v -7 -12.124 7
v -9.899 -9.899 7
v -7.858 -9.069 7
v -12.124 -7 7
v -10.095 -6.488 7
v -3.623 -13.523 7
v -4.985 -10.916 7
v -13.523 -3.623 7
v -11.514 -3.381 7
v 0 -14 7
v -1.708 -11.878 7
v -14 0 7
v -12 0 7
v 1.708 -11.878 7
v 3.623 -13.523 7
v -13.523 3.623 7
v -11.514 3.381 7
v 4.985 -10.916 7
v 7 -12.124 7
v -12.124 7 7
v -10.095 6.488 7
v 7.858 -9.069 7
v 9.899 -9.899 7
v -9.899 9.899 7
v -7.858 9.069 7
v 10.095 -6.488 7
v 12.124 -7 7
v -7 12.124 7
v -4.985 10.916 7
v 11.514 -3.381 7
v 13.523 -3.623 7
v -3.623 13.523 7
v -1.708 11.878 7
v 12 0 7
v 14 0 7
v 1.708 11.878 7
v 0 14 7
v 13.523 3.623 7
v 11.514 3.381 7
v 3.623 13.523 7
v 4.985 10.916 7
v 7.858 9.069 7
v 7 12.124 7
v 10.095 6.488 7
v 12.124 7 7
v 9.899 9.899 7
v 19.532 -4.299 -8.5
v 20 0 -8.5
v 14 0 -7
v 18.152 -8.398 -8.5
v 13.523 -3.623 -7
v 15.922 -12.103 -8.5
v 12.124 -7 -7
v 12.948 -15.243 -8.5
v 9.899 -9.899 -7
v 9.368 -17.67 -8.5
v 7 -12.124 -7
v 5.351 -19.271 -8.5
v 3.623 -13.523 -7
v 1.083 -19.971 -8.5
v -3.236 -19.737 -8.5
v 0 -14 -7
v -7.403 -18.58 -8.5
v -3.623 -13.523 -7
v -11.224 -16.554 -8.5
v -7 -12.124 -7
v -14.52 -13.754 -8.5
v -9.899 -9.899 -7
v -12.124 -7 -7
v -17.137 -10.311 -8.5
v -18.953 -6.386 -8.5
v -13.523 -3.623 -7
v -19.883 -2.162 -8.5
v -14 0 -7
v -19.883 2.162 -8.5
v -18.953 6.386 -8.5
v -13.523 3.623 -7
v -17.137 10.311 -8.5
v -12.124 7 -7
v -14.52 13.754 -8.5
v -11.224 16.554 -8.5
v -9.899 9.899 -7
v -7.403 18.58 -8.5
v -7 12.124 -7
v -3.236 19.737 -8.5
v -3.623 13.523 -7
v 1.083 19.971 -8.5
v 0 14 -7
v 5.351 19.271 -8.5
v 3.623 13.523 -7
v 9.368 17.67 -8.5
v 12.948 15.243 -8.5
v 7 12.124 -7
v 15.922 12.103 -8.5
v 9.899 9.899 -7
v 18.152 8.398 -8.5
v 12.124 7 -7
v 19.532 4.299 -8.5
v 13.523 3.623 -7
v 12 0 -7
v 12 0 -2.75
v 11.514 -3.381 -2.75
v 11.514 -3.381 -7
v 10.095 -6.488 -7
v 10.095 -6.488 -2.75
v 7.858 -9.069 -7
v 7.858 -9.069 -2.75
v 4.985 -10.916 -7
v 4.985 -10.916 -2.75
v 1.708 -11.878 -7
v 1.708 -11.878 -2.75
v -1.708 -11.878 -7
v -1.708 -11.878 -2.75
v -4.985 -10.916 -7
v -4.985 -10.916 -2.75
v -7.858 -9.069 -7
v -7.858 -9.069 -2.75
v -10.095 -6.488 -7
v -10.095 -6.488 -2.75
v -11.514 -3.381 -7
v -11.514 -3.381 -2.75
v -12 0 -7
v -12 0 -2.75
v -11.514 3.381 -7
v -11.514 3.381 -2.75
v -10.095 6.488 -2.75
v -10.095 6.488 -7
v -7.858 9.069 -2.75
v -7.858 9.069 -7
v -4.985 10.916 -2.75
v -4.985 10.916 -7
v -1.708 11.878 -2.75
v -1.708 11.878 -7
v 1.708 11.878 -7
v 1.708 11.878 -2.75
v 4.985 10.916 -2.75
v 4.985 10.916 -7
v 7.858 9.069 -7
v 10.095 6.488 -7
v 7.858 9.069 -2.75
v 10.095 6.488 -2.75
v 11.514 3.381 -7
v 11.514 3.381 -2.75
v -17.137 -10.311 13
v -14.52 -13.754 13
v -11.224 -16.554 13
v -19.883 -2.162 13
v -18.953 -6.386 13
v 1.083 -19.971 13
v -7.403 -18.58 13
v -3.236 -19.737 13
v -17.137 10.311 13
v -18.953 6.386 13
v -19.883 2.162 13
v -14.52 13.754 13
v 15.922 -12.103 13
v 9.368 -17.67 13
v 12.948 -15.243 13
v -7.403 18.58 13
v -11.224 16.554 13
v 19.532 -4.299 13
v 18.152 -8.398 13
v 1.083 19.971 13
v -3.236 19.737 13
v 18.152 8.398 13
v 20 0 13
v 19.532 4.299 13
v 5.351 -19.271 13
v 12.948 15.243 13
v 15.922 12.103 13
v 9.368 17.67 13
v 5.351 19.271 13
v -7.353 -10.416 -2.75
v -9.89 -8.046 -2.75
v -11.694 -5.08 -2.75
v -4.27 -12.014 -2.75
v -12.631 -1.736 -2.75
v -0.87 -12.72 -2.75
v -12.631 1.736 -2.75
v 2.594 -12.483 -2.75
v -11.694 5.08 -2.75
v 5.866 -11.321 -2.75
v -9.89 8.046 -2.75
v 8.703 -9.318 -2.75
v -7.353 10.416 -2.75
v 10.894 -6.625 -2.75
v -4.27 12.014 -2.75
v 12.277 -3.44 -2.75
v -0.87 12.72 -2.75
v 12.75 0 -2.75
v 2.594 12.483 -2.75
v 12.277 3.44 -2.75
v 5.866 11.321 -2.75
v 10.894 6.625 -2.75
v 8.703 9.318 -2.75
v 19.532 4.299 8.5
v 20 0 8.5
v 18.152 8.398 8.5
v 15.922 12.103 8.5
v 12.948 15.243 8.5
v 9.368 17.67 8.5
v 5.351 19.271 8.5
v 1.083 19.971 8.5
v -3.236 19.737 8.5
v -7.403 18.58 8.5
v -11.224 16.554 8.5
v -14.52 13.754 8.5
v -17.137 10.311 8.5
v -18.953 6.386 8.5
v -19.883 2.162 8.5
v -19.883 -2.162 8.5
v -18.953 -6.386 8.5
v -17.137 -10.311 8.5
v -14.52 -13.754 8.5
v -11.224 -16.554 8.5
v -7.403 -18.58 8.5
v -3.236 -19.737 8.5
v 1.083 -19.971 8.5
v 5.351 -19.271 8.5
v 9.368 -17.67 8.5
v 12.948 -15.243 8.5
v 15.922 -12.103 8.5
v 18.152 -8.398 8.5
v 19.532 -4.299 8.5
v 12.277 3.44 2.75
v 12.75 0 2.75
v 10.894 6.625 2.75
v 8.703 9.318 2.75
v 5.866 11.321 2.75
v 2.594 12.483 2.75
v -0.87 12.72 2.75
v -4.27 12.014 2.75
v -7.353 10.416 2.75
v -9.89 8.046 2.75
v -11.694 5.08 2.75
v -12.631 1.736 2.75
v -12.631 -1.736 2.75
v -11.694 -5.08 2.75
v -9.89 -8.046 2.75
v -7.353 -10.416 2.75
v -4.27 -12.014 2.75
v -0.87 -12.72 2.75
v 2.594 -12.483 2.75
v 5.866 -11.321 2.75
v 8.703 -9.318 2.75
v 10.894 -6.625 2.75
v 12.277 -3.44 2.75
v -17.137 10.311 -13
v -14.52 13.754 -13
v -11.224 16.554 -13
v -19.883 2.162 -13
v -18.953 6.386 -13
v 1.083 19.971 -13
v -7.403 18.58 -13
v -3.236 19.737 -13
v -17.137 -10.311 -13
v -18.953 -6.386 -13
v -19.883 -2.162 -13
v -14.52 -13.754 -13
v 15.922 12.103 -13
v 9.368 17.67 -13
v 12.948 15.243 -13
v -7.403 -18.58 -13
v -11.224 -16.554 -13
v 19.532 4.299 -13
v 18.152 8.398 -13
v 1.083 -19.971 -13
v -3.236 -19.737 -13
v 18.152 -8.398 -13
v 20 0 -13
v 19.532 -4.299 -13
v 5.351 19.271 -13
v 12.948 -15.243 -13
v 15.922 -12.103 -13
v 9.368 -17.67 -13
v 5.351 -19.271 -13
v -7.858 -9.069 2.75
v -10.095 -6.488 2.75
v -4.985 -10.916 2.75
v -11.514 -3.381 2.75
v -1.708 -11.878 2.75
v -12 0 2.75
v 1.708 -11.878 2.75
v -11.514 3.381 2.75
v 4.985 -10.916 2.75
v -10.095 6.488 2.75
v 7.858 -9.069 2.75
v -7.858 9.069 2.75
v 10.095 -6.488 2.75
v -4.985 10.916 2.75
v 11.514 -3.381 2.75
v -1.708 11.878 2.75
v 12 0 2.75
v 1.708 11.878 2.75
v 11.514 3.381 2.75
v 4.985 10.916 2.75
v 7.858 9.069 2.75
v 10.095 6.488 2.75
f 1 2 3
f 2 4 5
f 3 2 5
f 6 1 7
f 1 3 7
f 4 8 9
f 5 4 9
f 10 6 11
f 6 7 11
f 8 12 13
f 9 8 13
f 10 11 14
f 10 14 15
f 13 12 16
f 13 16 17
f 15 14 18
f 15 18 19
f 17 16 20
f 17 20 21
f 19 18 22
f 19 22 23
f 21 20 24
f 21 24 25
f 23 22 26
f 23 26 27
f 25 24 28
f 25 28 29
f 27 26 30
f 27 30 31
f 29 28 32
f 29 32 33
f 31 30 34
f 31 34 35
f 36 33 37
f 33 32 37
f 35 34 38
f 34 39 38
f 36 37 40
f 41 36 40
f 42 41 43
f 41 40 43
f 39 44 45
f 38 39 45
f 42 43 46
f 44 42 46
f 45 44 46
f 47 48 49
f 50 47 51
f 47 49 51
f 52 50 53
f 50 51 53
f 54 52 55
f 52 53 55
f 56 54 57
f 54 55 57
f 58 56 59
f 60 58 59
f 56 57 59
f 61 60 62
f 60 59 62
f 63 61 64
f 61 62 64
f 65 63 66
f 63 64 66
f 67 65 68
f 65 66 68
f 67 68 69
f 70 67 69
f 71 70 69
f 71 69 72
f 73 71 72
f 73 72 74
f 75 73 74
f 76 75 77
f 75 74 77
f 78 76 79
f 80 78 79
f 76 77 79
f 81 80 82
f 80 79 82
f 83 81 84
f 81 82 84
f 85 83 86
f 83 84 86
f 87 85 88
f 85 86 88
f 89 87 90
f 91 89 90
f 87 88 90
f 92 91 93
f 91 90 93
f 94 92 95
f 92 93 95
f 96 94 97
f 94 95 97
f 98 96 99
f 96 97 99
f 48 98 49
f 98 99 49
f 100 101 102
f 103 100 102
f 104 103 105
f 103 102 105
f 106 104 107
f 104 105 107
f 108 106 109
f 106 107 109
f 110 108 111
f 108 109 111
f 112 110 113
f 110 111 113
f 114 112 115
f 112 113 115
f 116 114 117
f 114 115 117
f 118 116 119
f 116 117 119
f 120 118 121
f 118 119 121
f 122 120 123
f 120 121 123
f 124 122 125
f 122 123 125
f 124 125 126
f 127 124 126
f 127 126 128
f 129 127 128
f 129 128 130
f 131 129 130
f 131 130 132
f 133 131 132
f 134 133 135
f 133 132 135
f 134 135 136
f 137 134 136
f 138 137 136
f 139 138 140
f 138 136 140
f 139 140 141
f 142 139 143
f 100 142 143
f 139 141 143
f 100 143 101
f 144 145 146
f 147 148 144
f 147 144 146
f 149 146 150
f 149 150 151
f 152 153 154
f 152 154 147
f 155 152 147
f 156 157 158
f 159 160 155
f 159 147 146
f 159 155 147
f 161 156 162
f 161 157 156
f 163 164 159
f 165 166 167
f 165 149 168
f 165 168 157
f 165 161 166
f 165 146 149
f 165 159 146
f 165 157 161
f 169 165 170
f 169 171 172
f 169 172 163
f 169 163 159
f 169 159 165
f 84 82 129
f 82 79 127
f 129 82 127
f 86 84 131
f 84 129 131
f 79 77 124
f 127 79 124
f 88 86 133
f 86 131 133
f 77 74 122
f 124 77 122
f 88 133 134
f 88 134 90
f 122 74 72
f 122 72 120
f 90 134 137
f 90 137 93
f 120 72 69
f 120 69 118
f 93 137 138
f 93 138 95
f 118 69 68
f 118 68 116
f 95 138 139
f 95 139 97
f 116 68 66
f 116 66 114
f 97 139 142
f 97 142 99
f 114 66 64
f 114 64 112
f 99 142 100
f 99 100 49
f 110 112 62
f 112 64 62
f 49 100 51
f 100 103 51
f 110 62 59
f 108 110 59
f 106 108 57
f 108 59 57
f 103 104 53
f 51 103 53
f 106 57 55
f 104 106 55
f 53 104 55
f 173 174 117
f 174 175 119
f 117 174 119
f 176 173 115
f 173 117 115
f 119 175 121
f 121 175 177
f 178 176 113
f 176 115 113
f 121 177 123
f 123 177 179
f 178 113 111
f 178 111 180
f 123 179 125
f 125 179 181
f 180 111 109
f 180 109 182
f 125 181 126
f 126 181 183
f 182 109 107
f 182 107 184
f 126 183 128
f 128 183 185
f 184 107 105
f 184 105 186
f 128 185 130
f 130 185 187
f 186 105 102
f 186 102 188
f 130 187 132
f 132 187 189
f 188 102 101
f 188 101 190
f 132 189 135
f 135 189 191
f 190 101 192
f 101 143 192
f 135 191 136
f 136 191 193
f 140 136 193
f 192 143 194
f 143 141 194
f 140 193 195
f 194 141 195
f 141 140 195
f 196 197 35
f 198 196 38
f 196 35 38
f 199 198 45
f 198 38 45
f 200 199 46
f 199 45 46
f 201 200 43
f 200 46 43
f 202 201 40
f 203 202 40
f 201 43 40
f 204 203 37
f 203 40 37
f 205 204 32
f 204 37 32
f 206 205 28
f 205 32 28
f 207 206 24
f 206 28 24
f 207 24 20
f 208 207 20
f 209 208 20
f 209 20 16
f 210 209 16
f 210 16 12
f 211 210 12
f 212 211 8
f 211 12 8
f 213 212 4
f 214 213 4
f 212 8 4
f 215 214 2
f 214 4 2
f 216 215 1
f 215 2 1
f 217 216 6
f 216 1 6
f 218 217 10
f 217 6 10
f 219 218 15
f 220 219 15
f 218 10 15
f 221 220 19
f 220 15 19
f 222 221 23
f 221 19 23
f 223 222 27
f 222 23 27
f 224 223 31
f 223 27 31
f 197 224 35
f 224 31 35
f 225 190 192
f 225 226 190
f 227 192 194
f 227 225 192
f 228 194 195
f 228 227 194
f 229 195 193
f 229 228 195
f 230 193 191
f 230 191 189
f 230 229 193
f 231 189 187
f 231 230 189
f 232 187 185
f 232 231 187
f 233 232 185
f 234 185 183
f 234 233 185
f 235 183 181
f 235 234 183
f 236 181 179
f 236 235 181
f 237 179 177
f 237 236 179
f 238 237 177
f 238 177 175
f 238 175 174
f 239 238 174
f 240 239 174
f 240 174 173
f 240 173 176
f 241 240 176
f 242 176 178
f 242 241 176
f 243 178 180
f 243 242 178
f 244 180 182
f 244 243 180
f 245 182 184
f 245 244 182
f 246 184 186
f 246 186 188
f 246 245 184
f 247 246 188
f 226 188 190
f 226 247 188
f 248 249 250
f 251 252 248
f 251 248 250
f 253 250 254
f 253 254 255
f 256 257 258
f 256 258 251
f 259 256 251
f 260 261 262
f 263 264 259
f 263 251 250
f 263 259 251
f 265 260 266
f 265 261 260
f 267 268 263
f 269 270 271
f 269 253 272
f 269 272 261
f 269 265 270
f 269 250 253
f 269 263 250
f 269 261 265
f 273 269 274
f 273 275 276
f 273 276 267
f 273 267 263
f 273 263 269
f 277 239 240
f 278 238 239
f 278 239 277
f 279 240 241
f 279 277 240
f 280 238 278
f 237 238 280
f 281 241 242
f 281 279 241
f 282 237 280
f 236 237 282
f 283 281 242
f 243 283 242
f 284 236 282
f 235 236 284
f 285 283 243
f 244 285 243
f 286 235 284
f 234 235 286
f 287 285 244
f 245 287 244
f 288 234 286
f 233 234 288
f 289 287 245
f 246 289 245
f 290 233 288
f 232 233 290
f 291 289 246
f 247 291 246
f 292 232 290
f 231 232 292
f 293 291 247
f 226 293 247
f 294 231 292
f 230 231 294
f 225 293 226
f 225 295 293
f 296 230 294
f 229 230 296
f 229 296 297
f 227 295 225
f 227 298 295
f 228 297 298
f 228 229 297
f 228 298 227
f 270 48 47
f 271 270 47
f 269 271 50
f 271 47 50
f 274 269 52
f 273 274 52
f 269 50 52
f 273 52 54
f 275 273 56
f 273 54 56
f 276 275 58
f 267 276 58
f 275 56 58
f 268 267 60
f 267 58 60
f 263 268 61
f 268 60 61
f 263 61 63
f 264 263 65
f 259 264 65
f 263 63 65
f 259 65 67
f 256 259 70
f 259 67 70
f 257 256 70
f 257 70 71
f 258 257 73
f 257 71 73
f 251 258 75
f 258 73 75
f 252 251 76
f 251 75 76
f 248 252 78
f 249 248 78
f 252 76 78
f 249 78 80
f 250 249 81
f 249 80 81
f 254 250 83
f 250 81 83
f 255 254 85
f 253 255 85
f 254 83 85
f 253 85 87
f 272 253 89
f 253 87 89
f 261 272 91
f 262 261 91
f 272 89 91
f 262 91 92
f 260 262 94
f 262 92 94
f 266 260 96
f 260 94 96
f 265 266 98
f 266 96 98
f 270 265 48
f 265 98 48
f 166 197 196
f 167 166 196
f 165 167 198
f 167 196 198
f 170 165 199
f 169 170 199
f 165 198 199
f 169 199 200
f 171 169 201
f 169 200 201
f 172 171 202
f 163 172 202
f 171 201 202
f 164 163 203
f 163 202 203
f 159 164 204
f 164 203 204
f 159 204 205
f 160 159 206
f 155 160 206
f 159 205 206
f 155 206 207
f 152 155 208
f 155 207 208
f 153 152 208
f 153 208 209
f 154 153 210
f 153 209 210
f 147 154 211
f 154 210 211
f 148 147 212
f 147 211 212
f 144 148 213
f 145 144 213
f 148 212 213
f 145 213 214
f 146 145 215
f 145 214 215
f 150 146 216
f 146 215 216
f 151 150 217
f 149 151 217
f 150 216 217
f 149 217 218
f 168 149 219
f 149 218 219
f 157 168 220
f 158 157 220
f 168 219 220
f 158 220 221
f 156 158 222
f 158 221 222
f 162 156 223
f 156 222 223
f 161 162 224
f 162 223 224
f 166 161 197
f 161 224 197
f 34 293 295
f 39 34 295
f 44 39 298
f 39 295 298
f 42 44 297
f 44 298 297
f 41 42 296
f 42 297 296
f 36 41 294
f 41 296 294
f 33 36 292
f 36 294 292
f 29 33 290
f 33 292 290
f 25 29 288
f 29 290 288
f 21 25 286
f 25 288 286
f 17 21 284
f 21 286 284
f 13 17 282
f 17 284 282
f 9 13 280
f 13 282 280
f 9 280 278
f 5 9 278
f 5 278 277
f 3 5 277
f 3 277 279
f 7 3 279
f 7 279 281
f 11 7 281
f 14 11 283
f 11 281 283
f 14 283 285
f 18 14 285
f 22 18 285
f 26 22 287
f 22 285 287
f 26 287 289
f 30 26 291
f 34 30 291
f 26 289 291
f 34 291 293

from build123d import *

# Parameters (mm, degrees)
F0_R      = 12.75
F1_DEPTH  = 2.75
F2_R      = 12
F3_DEPTH  = 4.25
F4_R      = 20
F5_DEPTH  = 6
F6_SIZE2  = 6
F6_SIZE   = 1.5
F7_R      = 12
F8_DEPTH  = 4.25
F9_R      = 20
F10_DEPTH = 6
F11_SIZE2 = 6
F11_SIZE  = 1.5


with BuildPart() as f1:
    # F0 (on Top) → F1 (new body, symmetric)
    with BuildSketch(Plane.XY):
        Circle(F0_R)
    extrude(amount=F1_DEPTH, both=True)

    # F2 (on face) → F3 (join)
    with BuildSketch(Plane.XY.offset(2.75)):
        Circle(F2_R)
    extrude(amount=F3_DEPTH)



with BuildPart() as f5:
    # F4 (on face) → F5 (new body)
    with BuildSketch(Plane(origin=(0, 0, -7), x_dir=(1, 0, 0), z_dir=(0, 0, -1))):
        Circle(F4_R)
    extrude(amount=F5_DEPTH)

    # F6
    f6_edges = [f5.edges().sort_by_distance(p)[0] for p in [
        (-20, 0, -7),
    ]]
    chamfer(f6_edges, length=F6_SIZE, length2=F6_SIZE2)


with BuildPart() as f1_1:
    add(f1.part)

    add(f5.part)  # F8 merges F5
    # F7 (on face) → F8 (join)
    with BuildSketch(Plane(origin=(0, 0, -2.75), x_dir=(1, 0, 0), z_dir=(0, 0, -1))):
        Circle(F7_R)
    extrude(amount=F8_DEPTH)

    # F9 (on face) → F10 (join)
    with BuildSketch(Plane.XY.offset(7)):
        Circle(F9_R)
    extrude(amount=F10_DEPTH)

    # F11
    f11_edges = [f1_1.edges().sort_by_distance(p)[0] for p in [
        (-20, 0, 7),
    ]]
    chamfer(f11_edges, length=F11_SIZE, length2=F11_SIZE2)


solid = f1_1.part
